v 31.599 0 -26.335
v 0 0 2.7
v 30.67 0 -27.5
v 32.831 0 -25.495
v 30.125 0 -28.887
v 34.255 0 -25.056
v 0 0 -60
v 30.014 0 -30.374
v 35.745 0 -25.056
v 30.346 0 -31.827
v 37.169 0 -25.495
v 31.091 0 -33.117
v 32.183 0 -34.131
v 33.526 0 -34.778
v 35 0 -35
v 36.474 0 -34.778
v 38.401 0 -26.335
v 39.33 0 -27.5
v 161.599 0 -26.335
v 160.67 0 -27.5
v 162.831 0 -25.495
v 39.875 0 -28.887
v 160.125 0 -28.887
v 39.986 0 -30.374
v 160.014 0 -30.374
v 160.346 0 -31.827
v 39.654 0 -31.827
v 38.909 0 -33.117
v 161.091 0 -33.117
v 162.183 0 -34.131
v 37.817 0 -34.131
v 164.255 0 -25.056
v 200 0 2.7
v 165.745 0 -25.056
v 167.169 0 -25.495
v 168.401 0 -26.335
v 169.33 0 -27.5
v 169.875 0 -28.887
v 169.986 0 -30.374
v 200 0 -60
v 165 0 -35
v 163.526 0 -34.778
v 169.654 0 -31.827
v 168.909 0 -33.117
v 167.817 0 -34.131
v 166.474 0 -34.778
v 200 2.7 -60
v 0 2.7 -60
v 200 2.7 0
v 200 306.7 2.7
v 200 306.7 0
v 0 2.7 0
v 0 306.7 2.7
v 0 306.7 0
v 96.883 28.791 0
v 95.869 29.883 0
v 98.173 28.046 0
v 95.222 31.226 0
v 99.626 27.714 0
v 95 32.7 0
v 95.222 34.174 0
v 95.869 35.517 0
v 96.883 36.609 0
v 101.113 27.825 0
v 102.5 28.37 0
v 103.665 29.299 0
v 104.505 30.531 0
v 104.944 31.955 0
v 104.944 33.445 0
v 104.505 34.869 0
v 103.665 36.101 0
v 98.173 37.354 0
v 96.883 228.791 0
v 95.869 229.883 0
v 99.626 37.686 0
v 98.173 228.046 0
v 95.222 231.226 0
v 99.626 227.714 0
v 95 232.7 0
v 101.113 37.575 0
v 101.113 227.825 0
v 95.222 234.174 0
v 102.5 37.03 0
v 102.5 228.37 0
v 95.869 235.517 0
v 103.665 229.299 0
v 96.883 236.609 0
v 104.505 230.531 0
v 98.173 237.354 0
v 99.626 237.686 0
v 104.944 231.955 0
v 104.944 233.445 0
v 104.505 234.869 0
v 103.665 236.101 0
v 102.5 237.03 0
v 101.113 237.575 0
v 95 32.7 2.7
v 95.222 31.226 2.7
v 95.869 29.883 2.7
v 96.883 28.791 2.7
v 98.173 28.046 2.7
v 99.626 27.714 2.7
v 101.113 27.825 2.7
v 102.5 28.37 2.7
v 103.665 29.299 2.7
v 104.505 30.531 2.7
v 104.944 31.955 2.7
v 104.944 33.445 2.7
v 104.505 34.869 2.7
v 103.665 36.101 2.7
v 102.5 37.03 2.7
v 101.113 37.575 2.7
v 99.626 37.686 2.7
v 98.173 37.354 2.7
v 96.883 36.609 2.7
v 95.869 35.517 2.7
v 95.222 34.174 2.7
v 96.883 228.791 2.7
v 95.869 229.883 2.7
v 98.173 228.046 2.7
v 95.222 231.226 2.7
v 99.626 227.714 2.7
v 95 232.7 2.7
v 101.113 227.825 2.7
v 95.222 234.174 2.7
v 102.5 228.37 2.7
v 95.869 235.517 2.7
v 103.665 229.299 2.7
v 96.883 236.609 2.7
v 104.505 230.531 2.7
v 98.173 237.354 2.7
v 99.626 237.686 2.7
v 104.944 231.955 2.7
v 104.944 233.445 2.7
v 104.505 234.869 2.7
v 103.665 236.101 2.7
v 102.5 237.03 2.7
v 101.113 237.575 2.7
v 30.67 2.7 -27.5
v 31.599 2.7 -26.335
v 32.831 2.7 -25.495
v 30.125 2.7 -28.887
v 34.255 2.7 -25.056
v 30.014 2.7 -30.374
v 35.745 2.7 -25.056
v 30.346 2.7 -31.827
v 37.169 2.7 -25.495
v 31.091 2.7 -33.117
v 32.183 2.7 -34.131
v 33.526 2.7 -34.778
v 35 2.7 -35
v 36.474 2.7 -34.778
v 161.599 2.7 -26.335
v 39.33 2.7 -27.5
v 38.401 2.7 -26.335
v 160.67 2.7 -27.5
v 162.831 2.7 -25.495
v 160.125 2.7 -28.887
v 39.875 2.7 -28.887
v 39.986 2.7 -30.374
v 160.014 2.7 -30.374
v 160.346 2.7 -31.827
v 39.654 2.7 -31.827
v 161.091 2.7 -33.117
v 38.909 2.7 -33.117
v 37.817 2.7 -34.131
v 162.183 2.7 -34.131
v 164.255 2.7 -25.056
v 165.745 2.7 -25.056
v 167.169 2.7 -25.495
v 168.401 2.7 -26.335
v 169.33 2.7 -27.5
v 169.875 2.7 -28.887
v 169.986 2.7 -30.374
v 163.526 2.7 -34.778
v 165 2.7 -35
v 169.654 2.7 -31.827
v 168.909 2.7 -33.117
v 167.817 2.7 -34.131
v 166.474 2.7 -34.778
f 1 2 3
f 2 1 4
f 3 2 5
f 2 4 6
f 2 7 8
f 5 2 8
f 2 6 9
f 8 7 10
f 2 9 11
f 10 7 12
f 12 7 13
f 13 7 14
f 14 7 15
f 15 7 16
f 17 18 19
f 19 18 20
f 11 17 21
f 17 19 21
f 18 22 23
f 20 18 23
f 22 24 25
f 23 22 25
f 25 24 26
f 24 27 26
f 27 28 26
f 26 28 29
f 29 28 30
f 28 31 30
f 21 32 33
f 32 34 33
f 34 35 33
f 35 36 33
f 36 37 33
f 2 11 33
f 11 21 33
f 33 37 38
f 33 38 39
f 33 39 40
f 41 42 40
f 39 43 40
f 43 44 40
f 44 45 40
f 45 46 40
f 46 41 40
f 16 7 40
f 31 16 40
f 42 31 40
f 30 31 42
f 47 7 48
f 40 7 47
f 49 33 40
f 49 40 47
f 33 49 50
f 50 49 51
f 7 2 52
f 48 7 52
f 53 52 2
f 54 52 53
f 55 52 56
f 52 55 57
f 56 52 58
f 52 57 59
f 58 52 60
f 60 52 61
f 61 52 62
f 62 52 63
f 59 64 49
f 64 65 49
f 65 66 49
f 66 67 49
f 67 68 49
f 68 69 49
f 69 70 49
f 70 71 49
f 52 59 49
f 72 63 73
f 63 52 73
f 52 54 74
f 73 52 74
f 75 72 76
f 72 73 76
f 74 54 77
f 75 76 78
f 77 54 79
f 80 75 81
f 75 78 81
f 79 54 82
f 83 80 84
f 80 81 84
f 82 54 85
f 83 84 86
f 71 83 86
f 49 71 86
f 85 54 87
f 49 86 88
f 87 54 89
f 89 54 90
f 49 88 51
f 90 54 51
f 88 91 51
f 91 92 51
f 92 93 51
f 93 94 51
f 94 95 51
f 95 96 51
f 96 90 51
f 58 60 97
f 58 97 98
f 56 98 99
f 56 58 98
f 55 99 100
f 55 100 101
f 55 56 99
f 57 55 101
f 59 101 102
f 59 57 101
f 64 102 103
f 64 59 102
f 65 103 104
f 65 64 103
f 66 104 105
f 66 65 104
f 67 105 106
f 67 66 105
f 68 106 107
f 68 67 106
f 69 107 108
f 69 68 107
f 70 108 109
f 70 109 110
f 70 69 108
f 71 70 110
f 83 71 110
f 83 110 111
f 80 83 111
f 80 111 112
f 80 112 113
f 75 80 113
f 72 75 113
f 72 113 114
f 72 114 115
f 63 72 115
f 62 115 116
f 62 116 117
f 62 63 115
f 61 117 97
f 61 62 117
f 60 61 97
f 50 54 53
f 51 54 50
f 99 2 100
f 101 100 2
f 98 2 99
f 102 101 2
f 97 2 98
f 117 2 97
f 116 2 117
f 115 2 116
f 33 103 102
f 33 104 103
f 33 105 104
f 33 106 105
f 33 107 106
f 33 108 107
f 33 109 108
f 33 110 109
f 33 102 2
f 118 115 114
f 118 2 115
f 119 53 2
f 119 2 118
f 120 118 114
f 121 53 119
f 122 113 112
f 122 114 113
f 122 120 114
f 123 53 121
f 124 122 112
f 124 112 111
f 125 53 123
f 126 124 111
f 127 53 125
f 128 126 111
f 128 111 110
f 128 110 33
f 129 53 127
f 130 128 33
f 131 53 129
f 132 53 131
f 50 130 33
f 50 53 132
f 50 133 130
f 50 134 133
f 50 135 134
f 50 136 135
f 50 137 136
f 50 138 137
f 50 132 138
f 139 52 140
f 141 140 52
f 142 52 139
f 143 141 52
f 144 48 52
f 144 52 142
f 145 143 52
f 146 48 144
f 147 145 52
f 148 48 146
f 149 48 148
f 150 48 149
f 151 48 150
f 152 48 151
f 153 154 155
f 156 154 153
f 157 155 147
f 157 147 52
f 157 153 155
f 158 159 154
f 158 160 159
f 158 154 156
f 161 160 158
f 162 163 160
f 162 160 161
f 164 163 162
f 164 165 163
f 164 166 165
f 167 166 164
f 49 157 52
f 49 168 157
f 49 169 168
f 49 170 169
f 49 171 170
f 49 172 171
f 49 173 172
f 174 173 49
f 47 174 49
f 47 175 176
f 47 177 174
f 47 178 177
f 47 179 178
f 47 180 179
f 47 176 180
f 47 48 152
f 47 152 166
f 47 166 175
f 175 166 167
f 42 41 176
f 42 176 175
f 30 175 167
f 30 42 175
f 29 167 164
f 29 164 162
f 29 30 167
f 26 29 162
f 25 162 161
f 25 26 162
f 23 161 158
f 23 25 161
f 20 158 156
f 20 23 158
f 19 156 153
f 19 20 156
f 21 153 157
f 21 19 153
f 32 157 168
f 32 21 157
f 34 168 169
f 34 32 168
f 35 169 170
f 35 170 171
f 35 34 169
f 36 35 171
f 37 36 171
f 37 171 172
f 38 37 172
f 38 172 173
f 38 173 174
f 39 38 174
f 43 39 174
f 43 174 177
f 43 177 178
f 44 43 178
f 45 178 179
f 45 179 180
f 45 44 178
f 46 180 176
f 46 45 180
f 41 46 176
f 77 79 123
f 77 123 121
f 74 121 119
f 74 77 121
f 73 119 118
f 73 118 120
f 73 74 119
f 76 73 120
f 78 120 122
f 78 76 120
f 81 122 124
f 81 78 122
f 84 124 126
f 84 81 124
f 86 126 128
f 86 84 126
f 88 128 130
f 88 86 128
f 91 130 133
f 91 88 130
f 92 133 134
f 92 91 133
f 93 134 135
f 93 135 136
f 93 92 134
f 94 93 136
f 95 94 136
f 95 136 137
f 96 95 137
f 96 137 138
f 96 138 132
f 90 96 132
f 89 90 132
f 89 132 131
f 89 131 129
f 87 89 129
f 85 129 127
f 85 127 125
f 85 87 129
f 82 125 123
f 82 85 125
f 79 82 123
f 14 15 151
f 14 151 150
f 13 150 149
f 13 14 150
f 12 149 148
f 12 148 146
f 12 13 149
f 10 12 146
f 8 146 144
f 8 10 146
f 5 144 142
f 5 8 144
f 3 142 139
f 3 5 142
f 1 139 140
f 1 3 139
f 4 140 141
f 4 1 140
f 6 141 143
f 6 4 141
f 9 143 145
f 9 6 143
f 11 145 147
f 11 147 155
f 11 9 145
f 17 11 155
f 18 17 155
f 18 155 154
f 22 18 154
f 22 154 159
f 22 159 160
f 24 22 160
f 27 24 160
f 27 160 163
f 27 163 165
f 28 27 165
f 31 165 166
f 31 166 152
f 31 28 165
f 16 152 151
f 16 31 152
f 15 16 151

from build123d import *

# Parameters (mm, degrees)
SKETCH1_W           = 200
SKETCH1_H           = 60
SKETCH1_R           = 5
BOSS_EXTRUDE1_DEPTH = 2.7
SKETCH2_W           = 200
SKETCH2_H           = 306.7
SKETCH2_R           = 5
BOSS_EXTRUDE2_DEPTH = 2.7


with BuildPart() as part:
    # Sketch1 → Boss-Extrude1 (new body)
    with BuildSketch(Plane(origin=(0, 0, 0), x_dir=(1, 0, 0), z_dir=(0, 1, 0))):
        with Locations((100, 30)):
            Rectangle(SKETCH1_W, SKETCH1_H)
        with Locations(Location((35, 30, 0), (0, 0, 90))):
            Circle(SKETCH1_R, mode=Mode.SUBTRACT)
        with Locations(Location((165, 30, 0), (0, 0, 90))):
            Circle(SKETCH1_R, mode=Mode.SUBTRACT)
    extrude(amount=BOSS_EXTRUDE1_DEPTH)

    # Sketch2 → Boss-Extrude2 (add)
    with BuildSketch(Plane.XY):
        with Locations((100, 153.35)):
            Rectangle(SKETCH2_W, SKETCH2_H)
        with Locations(Location((100, 32.7, 0), (0, 0, 180))):
            Circle(SKETCH2_R, mode=Mode.SUBTRACT)
        with Locations(Location((100, 232.7, 0), (0, 0, 180))):
            Circle(SKETCH2_R, mode=Mode.SUBTRACT)
    extrude(amount=BOSS_EXTRUDE2_DEPTH)


solid = part.part
